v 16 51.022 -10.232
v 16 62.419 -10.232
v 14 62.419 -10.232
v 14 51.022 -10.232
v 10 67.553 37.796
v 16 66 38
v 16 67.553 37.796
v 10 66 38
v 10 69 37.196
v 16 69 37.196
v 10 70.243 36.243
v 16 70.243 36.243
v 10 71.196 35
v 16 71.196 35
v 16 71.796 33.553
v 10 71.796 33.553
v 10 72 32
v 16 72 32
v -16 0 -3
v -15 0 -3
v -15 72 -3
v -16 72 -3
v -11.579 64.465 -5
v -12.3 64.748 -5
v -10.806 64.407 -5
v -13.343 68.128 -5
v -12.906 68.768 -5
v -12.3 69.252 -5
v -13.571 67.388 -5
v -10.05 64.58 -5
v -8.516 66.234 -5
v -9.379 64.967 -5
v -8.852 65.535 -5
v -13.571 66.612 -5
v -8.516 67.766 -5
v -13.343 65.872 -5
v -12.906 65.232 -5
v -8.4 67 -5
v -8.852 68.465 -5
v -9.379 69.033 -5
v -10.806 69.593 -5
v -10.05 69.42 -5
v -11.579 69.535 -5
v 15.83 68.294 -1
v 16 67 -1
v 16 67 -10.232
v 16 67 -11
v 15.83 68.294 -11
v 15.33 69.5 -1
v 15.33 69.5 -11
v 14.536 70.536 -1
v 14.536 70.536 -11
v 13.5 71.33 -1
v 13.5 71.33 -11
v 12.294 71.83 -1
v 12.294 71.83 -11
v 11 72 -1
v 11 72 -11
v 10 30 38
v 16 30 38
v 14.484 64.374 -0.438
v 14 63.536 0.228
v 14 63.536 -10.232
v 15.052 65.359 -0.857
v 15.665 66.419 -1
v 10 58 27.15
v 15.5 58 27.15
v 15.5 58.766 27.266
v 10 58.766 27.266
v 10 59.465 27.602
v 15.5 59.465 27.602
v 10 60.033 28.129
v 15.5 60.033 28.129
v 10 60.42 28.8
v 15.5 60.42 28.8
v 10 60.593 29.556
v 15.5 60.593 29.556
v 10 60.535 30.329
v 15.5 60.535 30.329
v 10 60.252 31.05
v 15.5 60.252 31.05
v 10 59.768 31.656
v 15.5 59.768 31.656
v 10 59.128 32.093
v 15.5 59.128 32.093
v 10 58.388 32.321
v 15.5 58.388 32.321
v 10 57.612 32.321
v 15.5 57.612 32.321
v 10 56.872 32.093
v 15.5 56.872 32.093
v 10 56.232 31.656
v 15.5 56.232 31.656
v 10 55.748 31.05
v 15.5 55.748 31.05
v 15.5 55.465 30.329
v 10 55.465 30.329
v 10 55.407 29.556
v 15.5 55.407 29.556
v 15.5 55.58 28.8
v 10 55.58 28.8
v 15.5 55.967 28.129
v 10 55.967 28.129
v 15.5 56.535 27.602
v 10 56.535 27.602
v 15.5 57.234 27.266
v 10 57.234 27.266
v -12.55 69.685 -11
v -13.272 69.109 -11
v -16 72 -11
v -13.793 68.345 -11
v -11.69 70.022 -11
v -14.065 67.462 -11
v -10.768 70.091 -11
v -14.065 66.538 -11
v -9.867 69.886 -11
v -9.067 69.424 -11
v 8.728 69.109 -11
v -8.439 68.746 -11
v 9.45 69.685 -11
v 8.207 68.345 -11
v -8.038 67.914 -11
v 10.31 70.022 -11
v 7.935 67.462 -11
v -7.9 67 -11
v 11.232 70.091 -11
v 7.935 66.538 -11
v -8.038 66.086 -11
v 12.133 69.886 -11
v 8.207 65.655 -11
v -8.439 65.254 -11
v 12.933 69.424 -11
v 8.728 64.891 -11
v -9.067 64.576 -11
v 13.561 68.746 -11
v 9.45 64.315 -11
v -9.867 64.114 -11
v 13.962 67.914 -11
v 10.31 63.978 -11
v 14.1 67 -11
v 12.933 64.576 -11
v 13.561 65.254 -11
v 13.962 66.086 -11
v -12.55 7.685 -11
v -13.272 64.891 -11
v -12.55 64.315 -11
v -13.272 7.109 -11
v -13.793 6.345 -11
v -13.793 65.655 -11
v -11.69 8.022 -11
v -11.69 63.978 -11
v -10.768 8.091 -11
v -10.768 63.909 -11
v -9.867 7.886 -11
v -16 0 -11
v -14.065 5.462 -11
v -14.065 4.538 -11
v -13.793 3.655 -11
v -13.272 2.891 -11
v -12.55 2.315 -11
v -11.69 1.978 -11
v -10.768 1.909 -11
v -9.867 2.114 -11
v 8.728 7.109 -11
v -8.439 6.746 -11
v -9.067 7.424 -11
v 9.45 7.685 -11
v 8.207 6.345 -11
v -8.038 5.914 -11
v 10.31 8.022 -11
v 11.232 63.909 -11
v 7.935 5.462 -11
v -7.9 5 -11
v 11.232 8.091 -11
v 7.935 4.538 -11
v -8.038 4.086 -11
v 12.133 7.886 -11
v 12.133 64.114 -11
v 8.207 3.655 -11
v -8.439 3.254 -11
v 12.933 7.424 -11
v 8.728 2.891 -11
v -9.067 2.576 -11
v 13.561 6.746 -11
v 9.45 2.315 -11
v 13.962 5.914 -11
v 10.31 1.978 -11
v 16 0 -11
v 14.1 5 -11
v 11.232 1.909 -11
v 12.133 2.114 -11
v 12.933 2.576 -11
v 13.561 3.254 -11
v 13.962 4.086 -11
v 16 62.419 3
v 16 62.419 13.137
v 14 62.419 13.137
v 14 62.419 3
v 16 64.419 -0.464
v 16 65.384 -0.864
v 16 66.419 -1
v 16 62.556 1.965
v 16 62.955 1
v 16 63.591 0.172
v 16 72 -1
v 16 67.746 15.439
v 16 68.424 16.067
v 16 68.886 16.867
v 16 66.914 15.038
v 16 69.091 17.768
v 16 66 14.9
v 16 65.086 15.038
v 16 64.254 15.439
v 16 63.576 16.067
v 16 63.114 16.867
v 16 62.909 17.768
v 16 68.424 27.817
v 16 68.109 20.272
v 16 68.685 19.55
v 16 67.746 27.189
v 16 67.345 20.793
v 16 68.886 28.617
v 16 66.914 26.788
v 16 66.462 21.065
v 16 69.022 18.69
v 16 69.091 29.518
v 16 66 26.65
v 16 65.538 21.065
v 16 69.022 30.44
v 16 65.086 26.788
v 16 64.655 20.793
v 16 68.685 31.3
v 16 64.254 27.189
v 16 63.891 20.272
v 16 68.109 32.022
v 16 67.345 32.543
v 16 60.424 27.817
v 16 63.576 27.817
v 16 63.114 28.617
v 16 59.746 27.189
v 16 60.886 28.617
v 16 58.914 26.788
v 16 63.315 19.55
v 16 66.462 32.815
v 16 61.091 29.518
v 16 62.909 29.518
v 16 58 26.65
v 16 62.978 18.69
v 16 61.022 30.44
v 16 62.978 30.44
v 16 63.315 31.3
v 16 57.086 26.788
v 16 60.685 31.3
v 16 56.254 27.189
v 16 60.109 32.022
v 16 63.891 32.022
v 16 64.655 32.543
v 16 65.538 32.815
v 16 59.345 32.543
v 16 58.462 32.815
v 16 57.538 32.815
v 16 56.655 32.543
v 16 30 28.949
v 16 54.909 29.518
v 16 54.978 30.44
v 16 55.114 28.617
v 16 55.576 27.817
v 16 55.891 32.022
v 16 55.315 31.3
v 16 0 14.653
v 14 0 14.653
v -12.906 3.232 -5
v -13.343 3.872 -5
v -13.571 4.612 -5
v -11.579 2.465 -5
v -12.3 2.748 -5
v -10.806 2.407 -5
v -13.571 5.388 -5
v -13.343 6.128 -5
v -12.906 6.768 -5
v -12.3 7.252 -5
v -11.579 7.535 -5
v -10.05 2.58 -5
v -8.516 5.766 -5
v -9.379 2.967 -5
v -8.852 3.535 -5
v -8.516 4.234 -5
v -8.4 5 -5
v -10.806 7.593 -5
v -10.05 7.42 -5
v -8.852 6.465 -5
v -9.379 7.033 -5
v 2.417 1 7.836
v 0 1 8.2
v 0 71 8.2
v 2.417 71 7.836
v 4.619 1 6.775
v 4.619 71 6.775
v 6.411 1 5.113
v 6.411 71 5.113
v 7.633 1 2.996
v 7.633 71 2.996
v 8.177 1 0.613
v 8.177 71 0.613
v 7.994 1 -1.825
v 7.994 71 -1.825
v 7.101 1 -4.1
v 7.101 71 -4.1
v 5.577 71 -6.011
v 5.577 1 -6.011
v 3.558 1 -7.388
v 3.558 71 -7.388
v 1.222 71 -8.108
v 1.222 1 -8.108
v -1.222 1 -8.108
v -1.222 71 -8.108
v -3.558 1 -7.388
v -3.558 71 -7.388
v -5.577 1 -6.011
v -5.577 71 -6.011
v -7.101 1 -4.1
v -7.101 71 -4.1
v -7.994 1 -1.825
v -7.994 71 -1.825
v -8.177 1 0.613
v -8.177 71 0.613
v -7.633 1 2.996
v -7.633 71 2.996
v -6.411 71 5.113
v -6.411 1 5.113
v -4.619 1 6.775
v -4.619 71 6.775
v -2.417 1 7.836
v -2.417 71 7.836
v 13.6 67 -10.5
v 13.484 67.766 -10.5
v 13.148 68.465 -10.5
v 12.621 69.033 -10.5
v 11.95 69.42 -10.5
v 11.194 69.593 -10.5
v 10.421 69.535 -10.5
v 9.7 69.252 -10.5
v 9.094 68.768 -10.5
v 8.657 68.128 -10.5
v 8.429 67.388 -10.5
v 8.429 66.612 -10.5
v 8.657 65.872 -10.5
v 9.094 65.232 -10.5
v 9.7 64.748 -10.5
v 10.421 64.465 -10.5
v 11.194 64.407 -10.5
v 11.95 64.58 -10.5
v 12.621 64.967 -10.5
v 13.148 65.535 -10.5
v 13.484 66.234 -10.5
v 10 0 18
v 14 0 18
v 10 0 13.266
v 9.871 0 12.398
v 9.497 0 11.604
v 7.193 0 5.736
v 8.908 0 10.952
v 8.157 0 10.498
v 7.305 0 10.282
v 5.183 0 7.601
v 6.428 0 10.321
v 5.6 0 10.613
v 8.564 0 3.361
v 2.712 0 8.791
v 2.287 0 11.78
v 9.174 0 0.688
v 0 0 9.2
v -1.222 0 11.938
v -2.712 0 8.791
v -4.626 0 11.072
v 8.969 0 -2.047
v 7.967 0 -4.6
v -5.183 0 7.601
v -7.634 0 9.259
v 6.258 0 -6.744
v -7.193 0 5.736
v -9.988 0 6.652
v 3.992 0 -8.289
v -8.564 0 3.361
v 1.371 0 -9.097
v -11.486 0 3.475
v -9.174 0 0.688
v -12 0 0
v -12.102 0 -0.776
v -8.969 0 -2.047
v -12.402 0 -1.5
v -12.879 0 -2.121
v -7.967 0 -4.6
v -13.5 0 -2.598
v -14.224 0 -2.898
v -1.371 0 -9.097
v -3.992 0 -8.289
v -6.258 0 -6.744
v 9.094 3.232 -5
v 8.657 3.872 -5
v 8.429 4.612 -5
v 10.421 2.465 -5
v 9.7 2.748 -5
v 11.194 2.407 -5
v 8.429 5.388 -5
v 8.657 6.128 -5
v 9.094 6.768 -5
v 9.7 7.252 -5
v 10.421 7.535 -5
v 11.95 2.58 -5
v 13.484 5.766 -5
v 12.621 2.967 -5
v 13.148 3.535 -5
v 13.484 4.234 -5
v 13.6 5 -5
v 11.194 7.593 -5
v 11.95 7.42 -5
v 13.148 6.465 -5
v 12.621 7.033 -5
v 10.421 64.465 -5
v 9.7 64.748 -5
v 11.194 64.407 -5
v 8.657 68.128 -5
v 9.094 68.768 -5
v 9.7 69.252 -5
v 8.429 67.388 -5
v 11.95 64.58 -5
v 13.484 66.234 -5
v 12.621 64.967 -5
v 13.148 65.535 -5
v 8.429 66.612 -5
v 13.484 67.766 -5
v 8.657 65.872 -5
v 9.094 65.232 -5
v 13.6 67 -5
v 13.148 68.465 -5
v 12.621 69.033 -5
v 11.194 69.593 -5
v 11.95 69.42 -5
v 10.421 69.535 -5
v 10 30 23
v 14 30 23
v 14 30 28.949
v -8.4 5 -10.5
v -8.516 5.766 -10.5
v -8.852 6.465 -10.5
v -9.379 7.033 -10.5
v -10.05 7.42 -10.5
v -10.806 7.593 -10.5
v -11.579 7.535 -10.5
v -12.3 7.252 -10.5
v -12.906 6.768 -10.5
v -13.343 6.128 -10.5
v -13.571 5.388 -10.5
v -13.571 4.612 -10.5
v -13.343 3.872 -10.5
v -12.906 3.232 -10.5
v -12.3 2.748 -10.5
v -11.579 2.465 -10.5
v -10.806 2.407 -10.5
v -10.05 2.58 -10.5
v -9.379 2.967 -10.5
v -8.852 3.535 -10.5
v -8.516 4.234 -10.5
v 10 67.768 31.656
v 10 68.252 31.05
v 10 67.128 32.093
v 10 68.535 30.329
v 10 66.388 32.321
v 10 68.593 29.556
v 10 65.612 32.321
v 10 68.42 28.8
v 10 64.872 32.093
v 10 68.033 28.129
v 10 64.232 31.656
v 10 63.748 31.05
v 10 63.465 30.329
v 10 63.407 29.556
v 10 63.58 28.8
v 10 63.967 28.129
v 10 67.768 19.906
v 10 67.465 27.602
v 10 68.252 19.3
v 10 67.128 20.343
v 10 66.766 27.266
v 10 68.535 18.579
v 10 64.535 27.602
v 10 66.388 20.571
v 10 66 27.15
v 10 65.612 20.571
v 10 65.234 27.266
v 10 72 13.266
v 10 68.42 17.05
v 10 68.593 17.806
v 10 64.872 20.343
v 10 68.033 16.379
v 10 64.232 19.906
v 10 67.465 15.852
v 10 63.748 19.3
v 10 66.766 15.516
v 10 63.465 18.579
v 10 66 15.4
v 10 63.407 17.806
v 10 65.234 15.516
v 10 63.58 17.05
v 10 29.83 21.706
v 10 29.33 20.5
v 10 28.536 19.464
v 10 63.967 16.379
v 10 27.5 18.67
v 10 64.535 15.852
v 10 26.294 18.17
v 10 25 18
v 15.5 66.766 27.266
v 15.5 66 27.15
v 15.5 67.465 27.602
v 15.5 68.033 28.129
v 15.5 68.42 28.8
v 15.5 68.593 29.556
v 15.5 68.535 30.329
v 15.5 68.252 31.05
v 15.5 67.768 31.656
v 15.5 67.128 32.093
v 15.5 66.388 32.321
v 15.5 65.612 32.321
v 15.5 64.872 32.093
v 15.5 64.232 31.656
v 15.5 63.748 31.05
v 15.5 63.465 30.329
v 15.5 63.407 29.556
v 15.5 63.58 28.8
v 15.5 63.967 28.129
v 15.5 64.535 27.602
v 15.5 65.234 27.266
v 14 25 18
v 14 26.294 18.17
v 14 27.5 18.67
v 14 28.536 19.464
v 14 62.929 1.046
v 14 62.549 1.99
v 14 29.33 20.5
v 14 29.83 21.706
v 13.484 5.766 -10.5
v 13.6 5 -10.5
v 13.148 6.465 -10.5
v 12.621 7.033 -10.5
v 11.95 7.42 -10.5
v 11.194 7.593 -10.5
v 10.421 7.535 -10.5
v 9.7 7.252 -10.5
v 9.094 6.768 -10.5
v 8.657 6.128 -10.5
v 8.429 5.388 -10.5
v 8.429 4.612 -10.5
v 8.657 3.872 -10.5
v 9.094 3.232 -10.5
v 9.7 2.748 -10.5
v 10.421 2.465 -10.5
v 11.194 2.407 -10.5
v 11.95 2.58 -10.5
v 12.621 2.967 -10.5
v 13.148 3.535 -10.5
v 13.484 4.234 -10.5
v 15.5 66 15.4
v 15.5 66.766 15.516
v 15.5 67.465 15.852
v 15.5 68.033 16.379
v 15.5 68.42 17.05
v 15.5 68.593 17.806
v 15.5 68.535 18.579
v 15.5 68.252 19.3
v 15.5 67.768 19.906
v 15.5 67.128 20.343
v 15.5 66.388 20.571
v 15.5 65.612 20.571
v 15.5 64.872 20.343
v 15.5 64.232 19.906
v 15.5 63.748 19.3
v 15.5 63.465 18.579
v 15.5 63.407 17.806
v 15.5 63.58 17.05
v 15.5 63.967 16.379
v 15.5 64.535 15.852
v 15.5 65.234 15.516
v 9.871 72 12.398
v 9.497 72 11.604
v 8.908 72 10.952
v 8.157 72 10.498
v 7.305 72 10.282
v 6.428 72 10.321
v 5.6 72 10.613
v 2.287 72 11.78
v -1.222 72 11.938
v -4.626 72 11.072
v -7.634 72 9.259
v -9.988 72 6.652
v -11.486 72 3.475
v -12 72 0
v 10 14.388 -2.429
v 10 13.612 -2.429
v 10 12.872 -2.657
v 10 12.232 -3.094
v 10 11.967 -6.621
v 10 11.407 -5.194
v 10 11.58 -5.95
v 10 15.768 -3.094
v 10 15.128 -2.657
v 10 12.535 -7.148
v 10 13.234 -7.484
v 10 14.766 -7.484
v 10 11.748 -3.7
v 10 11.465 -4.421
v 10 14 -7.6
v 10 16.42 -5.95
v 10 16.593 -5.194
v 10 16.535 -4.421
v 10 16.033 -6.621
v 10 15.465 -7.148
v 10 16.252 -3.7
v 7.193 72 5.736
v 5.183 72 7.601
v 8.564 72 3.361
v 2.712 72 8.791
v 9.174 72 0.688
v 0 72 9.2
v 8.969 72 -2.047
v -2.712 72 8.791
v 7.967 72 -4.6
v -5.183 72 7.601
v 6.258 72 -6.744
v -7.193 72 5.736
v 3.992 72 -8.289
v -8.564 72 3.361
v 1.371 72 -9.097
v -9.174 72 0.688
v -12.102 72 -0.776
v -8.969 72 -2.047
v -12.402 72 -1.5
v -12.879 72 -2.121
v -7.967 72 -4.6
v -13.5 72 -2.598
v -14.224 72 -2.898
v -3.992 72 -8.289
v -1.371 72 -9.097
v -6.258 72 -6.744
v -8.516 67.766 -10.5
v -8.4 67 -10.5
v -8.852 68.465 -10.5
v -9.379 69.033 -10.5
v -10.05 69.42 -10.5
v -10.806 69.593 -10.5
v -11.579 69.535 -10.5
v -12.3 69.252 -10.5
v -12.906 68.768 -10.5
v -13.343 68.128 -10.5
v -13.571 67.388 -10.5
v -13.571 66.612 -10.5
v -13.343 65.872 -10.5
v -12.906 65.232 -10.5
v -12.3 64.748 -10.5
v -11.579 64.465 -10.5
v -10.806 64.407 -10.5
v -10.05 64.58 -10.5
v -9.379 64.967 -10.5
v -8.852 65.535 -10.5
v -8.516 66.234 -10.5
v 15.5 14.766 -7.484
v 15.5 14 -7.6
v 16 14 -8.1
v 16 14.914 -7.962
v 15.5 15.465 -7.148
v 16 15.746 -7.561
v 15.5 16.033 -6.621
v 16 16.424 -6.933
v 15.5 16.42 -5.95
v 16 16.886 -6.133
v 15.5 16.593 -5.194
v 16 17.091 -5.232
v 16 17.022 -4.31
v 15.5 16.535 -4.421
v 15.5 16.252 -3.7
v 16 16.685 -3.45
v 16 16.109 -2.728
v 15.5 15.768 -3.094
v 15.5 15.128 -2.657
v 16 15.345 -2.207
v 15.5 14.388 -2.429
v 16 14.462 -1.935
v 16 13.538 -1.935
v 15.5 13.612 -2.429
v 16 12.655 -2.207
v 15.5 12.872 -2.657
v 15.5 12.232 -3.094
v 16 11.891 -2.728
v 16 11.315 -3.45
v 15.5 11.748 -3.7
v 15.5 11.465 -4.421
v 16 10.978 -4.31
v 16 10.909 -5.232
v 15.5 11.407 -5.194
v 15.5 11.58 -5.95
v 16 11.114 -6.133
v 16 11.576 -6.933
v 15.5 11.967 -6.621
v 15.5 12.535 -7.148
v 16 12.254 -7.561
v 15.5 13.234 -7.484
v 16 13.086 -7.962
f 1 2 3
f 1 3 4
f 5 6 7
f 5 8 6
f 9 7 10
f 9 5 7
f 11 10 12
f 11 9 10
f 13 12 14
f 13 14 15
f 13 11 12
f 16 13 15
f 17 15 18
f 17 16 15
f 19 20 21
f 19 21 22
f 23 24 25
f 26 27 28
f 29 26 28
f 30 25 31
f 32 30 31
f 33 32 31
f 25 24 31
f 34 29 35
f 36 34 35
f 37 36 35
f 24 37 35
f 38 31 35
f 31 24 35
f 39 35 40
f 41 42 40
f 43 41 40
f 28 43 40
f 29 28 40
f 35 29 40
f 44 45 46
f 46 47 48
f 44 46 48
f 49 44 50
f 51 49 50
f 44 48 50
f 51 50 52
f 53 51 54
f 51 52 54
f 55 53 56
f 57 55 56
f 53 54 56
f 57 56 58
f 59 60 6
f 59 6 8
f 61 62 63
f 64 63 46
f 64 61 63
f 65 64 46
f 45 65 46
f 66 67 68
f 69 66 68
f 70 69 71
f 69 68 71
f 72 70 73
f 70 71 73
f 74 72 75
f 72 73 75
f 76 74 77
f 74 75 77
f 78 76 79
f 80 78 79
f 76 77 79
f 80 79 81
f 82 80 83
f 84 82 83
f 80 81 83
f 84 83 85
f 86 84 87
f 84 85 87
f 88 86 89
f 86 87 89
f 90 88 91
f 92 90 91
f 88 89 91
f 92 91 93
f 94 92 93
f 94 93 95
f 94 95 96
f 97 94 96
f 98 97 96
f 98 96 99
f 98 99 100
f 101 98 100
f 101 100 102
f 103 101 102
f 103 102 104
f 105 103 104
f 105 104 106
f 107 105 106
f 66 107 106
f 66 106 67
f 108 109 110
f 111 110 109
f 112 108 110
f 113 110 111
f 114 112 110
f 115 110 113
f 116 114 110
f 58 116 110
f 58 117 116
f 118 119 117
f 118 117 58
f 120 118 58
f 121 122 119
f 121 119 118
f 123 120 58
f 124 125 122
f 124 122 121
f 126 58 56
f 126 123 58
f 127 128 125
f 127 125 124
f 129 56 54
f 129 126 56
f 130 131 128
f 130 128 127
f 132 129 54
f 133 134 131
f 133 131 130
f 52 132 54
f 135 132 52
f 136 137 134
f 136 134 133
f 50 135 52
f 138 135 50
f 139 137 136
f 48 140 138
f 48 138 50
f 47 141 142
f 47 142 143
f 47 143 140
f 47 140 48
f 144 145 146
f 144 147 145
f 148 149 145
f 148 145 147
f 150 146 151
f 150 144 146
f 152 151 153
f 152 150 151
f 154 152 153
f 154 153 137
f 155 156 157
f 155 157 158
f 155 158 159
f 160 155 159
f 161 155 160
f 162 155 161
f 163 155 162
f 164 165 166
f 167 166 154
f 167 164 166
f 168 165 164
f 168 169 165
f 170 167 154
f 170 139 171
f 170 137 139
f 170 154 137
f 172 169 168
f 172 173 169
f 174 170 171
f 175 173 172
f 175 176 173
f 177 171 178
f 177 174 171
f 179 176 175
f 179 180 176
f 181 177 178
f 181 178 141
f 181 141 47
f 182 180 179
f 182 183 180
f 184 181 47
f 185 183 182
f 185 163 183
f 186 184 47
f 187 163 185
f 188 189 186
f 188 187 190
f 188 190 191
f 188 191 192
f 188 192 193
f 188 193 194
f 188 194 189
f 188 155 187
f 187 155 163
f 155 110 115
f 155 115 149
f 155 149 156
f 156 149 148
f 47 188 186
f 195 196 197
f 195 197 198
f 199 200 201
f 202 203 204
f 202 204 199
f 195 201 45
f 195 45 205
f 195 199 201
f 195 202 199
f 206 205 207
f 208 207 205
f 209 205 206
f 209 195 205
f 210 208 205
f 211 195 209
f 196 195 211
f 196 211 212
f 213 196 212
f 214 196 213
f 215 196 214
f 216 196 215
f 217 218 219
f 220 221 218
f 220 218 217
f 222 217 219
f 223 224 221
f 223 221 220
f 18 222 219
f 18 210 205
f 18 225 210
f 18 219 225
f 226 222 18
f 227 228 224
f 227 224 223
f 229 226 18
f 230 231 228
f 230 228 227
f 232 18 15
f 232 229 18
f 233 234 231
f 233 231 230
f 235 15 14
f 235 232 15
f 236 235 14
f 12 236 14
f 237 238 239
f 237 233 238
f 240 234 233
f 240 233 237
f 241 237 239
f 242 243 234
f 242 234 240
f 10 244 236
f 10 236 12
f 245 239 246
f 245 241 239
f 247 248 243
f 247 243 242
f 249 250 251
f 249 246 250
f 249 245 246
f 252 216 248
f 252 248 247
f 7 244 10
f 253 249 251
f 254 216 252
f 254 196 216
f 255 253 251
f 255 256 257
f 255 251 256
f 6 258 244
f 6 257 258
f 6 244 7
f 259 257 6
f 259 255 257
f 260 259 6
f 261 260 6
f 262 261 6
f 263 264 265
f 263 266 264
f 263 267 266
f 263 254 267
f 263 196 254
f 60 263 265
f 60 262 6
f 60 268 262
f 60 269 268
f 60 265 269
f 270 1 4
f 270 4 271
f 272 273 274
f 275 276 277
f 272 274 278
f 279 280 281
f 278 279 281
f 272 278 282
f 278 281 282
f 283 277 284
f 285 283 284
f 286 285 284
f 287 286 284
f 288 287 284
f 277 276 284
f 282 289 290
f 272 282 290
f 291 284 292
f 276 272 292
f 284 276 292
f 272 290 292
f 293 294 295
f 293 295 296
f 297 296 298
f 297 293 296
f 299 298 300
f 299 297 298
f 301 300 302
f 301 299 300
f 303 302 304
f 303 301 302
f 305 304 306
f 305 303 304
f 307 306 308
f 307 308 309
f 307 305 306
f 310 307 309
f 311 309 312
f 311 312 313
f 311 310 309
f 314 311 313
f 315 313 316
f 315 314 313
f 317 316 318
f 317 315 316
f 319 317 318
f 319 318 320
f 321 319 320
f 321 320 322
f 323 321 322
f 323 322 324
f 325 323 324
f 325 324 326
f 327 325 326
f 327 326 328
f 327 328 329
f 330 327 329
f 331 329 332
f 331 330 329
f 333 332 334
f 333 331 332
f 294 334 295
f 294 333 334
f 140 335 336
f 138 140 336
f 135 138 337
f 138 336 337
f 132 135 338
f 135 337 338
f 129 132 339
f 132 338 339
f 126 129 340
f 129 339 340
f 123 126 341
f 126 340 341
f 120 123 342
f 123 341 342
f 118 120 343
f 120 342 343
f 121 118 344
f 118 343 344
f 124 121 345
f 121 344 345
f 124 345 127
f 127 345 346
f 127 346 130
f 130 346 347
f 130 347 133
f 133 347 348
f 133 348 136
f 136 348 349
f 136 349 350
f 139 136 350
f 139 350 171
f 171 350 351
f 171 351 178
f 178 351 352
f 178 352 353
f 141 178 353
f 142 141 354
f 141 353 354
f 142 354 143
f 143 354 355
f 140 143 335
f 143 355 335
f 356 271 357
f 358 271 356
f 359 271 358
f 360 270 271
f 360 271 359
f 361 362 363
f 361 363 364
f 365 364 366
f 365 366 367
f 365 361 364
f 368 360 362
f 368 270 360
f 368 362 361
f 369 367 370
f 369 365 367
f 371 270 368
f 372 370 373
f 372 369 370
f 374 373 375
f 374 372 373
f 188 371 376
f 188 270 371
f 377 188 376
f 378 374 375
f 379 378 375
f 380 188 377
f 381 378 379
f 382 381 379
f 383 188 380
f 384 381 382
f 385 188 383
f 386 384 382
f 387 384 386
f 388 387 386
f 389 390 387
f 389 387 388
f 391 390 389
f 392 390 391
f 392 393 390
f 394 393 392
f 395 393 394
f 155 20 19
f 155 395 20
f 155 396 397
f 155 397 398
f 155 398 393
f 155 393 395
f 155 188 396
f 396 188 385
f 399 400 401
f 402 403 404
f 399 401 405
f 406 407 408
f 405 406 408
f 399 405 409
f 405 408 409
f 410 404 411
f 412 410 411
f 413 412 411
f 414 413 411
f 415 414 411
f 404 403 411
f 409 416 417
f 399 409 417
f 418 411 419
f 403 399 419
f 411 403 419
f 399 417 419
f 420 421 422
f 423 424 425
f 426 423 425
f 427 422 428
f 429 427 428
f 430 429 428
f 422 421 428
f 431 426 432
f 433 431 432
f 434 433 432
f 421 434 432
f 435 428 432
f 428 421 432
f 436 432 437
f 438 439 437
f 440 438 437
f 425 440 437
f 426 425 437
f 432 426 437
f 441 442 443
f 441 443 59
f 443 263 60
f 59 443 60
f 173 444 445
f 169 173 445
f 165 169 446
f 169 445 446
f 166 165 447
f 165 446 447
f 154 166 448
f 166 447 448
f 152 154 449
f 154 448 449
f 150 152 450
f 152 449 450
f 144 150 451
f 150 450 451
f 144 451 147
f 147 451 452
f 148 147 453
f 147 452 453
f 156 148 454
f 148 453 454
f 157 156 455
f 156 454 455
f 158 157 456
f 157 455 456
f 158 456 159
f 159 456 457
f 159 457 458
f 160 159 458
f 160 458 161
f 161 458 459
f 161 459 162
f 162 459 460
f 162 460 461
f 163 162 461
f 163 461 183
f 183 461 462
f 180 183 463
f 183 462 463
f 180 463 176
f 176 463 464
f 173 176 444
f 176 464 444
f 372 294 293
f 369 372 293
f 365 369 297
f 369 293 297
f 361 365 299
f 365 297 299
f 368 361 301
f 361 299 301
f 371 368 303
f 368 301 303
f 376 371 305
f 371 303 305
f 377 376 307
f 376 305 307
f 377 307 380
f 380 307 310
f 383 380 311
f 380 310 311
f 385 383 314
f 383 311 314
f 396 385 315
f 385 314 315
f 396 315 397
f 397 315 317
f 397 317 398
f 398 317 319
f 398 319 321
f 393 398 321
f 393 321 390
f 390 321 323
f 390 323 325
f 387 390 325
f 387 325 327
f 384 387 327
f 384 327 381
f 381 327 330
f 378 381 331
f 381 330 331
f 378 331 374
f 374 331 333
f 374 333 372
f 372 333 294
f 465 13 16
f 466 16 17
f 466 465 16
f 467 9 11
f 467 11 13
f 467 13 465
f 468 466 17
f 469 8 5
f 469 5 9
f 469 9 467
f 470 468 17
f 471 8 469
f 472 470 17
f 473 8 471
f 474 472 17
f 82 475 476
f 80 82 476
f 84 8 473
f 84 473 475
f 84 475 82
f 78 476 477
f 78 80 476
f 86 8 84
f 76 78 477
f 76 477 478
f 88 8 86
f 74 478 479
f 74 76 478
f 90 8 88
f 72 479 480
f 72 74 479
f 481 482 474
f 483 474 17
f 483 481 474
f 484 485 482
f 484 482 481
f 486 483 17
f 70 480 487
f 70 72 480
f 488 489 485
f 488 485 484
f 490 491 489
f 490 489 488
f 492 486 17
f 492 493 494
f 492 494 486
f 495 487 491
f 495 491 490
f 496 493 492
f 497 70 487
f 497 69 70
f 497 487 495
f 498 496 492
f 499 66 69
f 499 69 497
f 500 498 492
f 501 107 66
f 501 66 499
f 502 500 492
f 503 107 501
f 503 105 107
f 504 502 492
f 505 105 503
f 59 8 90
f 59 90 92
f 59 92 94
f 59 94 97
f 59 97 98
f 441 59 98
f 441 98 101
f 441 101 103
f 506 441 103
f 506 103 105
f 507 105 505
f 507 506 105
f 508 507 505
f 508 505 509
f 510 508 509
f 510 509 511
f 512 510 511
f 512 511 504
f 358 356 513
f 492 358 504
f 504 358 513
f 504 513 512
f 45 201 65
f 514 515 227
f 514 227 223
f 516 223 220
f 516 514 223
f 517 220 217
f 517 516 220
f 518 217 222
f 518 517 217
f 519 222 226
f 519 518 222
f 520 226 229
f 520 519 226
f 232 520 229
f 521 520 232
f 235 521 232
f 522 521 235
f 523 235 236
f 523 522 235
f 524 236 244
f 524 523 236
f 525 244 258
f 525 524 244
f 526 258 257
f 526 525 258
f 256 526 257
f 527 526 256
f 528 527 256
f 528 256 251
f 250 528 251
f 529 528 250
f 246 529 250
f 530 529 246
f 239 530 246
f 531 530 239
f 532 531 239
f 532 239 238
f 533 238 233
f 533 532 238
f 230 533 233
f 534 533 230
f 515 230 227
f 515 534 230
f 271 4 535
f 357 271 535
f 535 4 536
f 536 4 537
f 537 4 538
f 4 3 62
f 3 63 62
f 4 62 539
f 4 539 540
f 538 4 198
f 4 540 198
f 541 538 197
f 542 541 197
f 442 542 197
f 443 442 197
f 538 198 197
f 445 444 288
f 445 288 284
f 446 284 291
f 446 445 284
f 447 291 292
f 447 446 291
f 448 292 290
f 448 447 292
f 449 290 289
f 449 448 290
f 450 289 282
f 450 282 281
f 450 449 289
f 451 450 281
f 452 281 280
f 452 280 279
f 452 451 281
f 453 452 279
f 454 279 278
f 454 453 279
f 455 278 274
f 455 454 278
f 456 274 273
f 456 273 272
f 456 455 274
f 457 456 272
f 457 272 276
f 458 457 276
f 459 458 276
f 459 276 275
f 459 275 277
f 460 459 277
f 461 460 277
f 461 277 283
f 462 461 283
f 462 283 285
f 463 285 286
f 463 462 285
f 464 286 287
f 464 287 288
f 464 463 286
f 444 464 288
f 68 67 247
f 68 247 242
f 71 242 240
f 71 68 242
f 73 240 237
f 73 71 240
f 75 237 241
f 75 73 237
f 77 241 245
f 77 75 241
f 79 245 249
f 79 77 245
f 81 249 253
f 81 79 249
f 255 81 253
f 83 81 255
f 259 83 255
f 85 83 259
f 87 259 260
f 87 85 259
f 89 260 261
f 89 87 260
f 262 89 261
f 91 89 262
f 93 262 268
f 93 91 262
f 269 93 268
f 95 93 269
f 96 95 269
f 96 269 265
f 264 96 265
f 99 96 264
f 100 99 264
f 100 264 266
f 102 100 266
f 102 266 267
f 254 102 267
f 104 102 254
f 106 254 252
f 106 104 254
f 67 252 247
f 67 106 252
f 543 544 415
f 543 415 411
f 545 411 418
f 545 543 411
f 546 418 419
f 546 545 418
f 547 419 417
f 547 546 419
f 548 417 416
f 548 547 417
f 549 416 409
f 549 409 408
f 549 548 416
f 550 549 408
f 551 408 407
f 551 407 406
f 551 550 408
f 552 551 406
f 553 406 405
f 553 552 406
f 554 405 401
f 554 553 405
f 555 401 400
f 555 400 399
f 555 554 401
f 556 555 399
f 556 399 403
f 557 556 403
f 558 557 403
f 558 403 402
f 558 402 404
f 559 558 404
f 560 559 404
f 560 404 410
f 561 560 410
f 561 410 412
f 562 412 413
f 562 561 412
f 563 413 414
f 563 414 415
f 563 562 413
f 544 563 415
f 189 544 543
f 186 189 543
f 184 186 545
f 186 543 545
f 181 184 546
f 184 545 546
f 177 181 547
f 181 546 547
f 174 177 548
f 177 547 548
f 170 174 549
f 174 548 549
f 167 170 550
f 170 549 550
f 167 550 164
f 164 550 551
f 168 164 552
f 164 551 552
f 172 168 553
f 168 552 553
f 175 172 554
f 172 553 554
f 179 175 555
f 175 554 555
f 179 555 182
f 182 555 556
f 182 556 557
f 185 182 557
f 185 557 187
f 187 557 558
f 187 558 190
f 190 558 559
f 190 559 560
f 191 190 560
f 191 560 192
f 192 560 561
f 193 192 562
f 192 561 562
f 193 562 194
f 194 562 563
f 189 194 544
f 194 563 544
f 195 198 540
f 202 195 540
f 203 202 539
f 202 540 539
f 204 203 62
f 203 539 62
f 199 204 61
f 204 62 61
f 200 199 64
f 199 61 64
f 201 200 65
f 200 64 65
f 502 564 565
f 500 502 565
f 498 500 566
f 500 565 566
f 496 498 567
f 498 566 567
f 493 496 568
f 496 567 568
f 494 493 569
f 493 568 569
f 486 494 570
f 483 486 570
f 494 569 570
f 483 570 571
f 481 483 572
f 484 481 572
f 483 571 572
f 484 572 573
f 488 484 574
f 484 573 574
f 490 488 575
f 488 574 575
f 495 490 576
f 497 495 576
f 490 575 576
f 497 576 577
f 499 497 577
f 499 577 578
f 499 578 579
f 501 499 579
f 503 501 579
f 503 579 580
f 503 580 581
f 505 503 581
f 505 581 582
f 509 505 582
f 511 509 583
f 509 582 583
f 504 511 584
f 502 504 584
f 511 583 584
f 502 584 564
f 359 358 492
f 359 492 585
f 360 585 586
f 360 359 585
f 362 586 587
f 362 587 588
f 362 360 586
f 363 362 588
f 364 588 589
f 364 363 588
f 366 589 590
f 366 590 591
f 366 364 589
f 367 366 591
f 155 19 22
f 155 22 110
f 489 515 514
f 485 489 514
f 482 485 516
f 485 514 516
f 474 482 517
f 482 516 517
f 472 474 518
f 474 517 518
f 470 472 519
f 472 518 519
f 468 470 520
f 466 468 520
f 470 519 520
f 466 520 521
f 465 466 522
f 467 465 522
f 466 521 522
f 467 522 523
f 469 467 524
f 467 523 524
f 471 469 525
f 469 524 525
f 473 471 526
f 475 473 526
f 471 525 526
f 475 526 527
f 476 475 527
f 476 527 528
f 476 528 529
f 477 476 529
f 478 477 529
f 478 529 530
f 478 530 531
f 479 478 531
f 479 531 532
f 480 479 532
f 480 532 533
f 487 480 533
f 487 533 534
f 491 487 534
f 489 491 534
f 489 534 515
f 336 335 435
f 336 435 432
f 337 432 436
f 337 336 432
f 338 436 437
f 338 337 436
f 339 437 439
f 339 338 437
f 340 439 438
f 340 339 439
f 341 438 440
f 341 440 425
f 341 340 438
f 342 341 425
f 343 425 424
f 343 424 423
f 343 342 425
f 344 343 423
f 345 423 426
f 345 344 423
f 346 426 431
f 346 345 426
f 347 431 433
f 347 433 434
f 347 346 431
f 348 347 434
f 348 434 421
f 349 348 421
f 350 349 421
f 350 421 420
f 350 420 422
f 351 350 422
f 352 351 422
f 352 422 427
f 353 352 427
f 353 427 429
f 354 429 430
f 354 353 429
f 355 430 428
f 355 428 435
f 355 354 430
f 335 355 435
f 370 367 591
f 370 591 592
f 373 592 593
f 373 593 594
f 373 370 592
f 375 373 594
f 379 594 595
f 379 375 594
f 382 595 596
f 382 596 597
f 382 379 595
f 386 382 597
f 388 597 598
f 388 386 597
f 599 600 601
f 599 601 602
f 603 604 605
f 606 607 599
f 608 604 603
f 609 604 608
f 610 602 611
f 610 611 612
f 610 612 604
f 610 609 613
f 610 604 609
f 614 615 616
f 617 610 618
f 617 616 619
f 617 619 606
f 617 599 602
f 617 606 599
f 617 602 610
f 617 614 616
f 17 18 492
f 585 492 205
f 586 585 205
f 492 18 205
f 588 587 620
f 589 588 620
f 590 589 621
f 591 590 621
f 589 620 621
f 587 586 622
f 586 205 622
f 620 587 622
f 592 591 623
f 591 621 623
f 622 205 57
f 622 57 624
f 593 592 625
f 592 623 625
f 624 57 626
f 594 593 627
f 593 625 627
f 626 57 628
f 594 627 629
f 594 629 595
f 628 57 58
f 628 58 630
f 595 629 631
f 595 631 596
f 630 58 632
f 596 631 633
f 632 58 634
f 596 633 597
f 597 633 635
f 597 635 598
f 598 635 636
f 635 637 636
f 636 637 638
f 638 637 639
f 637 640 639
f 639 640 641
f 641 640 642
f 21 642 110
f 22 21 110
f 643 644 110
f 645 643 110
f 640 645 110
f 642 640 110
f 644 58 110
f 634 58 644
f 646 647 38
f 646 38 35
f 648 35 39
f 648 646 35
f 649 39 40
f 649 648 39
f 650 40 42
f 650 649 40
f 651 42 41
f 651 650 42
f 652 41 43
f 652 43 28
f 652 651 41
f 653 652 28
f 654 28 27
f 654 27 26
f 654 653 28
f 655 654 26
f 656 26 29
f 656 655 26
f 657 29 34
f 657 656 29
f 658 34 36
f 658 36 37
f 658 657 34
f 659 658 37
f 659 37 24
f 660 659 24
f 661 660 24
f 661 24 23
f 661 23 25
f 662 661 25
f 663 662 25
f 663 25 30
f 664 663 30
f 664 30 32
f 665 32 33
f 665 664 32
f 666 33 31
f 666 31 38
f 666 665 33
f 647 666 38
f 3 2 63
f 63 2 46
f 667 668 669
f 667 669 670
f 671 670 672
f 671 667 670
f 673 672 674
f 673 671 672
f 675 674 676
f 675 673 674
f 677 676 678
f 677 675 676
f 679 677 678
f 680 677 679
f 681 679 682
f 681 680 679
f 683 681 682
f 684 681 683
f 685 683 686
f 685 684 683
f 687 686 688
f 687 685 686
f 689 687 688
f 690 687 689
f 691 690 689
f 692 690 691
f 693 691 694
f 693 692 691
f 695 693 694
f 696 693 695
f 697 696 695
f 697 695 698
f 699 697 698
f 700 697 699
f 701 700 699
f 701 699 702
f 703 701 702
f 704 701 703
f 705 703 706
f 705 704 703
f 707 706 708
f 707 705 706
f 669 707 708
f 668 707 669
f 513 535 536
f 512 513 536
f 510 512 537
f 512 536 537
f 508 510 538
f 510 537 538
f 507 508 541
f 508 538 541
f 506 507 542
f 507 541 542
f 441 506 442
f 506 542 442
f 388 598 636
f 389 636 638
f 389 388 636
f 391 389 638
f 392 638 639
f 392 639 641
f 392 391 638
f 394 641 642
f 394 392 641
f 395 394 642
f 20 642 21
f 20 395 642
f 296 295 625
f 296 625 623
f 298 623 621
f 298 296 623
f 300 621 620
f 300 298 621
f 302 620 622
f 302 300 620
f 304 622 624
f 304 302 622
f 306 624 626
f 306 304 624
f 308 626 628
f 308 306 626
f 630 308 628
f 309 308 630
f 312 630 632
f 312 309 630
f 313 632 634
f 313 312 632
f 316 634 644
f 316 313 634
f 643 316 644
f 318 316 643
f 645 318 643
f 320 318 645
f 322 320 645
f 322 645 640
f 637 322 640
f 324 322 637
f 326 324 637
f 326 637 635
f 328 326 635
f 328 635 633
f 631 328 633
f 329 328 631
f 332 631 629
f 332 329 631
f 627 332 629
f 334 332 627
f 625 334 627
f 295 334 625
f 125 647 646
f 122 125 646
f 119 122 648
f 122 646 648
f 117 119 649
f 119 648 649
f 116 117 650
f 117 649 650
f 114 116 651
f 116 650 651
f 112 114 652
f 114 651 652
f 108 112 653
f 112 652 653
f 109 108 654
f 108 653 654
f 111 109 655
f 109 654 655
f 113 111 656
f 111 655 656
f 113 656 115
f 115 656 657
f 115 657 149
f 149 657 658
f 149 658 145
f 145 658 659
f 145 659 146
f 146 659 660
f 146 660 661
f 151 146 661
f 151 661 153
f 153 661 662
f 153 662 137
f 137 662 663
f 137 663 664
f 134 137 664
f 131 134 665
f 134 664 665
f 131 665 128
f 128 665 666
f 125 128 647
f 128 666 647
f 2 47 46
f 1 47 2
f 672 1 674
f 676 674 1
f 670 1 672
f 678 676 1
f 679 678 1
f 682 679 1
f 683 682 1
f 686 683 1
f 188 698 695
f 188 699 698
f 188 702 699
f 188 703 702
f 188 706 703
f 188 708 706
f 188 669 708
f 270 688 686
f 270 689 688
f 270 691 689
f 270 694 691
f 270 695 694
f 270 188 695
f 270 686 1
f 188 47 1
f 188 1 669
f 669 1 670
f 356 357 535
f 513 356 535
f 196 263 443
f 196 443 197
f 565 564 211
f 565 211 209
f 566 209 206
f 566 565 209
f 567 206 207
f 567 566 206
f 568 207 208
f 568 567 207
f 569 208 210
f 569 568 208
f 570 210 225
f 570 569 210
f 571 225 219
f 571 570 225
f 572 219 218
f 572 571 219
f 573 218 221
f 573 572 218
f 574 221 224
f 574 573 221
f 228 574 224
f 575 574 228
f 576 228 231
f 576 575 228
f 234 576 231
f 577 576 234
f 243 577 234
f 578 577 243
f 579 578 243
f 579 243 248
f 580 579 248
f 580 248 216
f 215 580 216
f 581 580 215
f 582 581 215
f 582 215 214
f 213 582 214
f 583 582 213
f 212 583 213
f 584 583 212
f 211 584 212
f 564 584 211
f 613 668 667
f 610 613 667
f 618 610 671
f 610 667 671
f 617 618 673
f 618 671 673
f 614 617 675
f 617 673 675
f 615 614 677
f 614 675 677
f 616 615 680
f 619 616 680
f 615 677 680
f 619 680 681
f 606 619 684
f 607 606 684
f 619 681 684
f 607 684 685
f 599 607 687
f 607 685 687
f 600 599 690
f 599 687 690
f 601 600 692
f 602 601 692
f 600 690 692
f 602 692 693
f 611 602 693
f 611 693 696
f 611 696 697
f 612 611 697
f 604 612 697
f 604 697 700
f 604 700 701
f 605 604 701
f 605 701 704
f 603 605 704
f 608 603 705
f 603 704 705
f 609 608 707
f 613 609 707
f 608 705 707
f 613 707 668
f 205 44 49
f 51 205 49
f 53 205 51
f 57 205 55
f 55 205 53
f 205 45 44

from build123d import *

# Parameters (mm, degrees)
SKETCH1_R               = 8.2
BOSS_EXTRUDE1_DEPTH     = 72
SKETCH2_R               = 2.6
CUT_EXTRUDE1_DEPTH      = 6
CHAMFER1_SIZE           = 0.5
CHAMFER2_SIZE           = 1
SKETCH3_R               = 2.6
CUT_EXTRUDE2_DEPTH      = 33
CUT_EXTRUDE3_DEPTH      = 10
CUT_EXTRUDE4_DEPTH      = 2
CUT_EXTRUDE5_DEPTH      = 10
CUT_EXTRUDE5_DEPTH_BACK = 10
CUT_EXTRUDE6_DEPTH      = 9.232013
FILLET1_R               = 4
FILLET2_R               = 6
SKETCH9_R               = 2.6
CUT_EXTRUDE7_DEPTH      = 6
CHAMFER3_SIZE           = 0.5


with BuildPart() as part:
    # Sketch1 → Boss-Extrude1 (new body)
    with BuildSketch(Plane(origin=(0, 0, 0), x_dir=(1, 0, 0), z_dir=(0, 1, 0))):
        with BuildLine():
            Line((-16, 11), (16, 11))
            Line((16, 11), (16, -38))
            Line((16, -38), (10, -38))
            Line((10, -38), (10, -13.266499161))
            ThreePointArc((10, -13.266499161), (8.549193338, -10.697452646), (5.6, -10.613199329))
            ThreePointArc((5.6, -10.613199329), (-6.196773354, -10.276186063), (-12, 0))
            ThreePointArc((-12, 0), (-12.878679656, 2.121320344), (-15, 3))
            Line((-15, 3), (-16, 3))
            Line((-16, 3), (-16, 11))
        make_face()
        with Locations(Location((0, 0, 0), (0, 0, 270))):  # turned: the seam where the file's is
            Circle(SKETCH1_R, mode=Mode.SUBTRACT)
    extrude(amount=BOSS_EXTRUDE1_DEPTH)

    # Sketch2 → Cut-Extrude1 (cut)
    with BuildSketch(Plane.XY.offset(-11)):
        with Locations((-11, 67)):
            Circle(SKETCH2_R)
        with Locations((-11, 5)):
            Circle(SKETCH2_R)
        with Locations((11, 67)):
            Circle(SKETCH2_R)
        with Locations((11, 5)):
            Circle(SKETCH2_R)
    extrude(amount=CUT_EXTRUDE1_DEPTH, mode=Mode.SUBTRACT)

    # Chamfer1
    chamfer1_edges = [part.edges().sort_by_distance(p)[0] for p in [
        (-13.6, 67, -11),
        (-13.6, 5, -11),
        (8.4, 67, -11),
        (8.4, 5, -11),
    ]]
    chamfer(chamfer1_edges, length=CHAMFER1_SIZE)

    # Chamfer2
    chamfer2_edges = [part.edges().sort_by_distance(p)[0] for p in [
        (0, 0, -8.2),
        (0, 72, -8.2),
    ]]
    chamfer(chamfer2_edges, length=CHAMFER2_SIZE)

    # Sketch3 → Cut-Extrude2 (cut, through all)
    with BuildSketch(Plane(origin=(16, 0, 0), x_dir=(0, 0, -1), z_dir=(1, 0, 0))):
        with Locations((-29.75, 66)):
            Circle(SKETCH3_R)
        with Locations((-29.75, 58)):
            Circle(SKETCH3_R)
    extrude(amount=-CUT_EXTRUDE2_DEPTH, mode=Mode.SUBTRACT)

    # Sketch4 → Cut-Extrude3 (cut)
    with BuildSketch(Plane(origin=(0, 0, -11), x_dir=(-1, 0, 0), z_dir=(0, 0, -1))):
        with BuildLine():
            Line((-11, 72), (-16, 72))
            Line((-16, 72), (-16, 67))
            ThreePointArc((-16, 67), (-14.535533906, 70.535533906), (-11, 72))
        make_face()
    extrude(amount=-CUT_EXTRUDE3_DEPTH, mode=Mode.SUBTRACT)

    # Sketch5 → Cut-Extrude4 (cut)
    with BuildSketch(Plane(origin=(16, 0, 0), x_dir=(0, 0, -1), z_dir=(1, 0, 0))):
        Polygon((10.232013106, 51.021676305), (-14.652921151, 0), (-38, 0), (-38, 11.441867396), (-13.136632097, 62.419326121), (10.232013106, 62.419326121), align=None)
    extrude(amount=-CUT_EXTRUDE4_DEPTH, mode=Mode.SUBTRACT)

    # Sketch6 → Cut-Extrude5 (cut, two sides)
    with BuildSketch(Plane(origin=(14, 0, 0), x_dir=(0, 0, -1), z_dir=(1, 0, 0))) as cut_extrude5_sk:
        with BuildLine():
            Line((-38, 0), (-18, 0))
            Line((-18, 0), (-18, 25))
            ThreePointArc((-18, 25), (-19.464466094, 28.535533906), (-23, 30))
            Line((-23, 30), (-38, 30))
            Line((-38, 30), (-38, 0))
        make_face()
    extrude(amount=CUT_EXTRUDE5_DEPTH, mode=Mode.SUBTRACT)
    extrude(cut_extrude5_sk.sketch, amount=-CUT_EXTRUDE5_DEPTH_BACK, mode=Mode.SUBTRACT)

    # Sketch8 → Cut-Extrude6 (cut)
    with BuildSketch(Plane(origin=(0, 0, -1), x_dir=(-1, 0, 0), z_dir=(0, 0, -1))):
        Polygon((-16, 67), (-16, 62.419326121), (-14, 62.419326121), (-14, 63.535898385), align=None)
    extrude(amount=CUT_EXTRUDE6_DEPTH, mode=Mode.SUBTRACT)

    # Fillet1
    fillet1_edges = [part.edges().sort_by_distance(p)[0] for p in [
        (15, 62.419326121, -1),
    ]]
    fillet(fillet1_edges, radius=FILLET1_R)

    # Fillet2
    fillet2_edges = [part.edges().sort_by_distance(p)[0] for p in [
        (13, 72, 38),
    ]]
    fillet(fillet2_edges, radius=FILLET2_R)

    # Sketch9 → Cut-Extrude7 (cut)
    with BuildSketch(Plane(origin=(16, 0, 0), x_dir=(0, 0, -1), z_dir=(1, 0, 0))):
        with Locations((-18, 66)):
            Circle(SKETCH9_R)
        with Locations((5, 14)):
            Circle(SKETCH9_R)
    extrude(amount=-CUT_EXTRUDE7_DEPTH, mode=Mode.SUBTRACT)

    # Chamfer3
    chamfer3_edges = [part.edges().sort_by_distance(p)[0] for p in [
        (16, 66, 20.6),
        (16, 14, -2.4),
        (16, 66, 32.35),
        (16, 58, 32.35),
    ]]
    chamfer(chamfer3_edges, length=CHAMFER3_SIZE)


solid = part.part
